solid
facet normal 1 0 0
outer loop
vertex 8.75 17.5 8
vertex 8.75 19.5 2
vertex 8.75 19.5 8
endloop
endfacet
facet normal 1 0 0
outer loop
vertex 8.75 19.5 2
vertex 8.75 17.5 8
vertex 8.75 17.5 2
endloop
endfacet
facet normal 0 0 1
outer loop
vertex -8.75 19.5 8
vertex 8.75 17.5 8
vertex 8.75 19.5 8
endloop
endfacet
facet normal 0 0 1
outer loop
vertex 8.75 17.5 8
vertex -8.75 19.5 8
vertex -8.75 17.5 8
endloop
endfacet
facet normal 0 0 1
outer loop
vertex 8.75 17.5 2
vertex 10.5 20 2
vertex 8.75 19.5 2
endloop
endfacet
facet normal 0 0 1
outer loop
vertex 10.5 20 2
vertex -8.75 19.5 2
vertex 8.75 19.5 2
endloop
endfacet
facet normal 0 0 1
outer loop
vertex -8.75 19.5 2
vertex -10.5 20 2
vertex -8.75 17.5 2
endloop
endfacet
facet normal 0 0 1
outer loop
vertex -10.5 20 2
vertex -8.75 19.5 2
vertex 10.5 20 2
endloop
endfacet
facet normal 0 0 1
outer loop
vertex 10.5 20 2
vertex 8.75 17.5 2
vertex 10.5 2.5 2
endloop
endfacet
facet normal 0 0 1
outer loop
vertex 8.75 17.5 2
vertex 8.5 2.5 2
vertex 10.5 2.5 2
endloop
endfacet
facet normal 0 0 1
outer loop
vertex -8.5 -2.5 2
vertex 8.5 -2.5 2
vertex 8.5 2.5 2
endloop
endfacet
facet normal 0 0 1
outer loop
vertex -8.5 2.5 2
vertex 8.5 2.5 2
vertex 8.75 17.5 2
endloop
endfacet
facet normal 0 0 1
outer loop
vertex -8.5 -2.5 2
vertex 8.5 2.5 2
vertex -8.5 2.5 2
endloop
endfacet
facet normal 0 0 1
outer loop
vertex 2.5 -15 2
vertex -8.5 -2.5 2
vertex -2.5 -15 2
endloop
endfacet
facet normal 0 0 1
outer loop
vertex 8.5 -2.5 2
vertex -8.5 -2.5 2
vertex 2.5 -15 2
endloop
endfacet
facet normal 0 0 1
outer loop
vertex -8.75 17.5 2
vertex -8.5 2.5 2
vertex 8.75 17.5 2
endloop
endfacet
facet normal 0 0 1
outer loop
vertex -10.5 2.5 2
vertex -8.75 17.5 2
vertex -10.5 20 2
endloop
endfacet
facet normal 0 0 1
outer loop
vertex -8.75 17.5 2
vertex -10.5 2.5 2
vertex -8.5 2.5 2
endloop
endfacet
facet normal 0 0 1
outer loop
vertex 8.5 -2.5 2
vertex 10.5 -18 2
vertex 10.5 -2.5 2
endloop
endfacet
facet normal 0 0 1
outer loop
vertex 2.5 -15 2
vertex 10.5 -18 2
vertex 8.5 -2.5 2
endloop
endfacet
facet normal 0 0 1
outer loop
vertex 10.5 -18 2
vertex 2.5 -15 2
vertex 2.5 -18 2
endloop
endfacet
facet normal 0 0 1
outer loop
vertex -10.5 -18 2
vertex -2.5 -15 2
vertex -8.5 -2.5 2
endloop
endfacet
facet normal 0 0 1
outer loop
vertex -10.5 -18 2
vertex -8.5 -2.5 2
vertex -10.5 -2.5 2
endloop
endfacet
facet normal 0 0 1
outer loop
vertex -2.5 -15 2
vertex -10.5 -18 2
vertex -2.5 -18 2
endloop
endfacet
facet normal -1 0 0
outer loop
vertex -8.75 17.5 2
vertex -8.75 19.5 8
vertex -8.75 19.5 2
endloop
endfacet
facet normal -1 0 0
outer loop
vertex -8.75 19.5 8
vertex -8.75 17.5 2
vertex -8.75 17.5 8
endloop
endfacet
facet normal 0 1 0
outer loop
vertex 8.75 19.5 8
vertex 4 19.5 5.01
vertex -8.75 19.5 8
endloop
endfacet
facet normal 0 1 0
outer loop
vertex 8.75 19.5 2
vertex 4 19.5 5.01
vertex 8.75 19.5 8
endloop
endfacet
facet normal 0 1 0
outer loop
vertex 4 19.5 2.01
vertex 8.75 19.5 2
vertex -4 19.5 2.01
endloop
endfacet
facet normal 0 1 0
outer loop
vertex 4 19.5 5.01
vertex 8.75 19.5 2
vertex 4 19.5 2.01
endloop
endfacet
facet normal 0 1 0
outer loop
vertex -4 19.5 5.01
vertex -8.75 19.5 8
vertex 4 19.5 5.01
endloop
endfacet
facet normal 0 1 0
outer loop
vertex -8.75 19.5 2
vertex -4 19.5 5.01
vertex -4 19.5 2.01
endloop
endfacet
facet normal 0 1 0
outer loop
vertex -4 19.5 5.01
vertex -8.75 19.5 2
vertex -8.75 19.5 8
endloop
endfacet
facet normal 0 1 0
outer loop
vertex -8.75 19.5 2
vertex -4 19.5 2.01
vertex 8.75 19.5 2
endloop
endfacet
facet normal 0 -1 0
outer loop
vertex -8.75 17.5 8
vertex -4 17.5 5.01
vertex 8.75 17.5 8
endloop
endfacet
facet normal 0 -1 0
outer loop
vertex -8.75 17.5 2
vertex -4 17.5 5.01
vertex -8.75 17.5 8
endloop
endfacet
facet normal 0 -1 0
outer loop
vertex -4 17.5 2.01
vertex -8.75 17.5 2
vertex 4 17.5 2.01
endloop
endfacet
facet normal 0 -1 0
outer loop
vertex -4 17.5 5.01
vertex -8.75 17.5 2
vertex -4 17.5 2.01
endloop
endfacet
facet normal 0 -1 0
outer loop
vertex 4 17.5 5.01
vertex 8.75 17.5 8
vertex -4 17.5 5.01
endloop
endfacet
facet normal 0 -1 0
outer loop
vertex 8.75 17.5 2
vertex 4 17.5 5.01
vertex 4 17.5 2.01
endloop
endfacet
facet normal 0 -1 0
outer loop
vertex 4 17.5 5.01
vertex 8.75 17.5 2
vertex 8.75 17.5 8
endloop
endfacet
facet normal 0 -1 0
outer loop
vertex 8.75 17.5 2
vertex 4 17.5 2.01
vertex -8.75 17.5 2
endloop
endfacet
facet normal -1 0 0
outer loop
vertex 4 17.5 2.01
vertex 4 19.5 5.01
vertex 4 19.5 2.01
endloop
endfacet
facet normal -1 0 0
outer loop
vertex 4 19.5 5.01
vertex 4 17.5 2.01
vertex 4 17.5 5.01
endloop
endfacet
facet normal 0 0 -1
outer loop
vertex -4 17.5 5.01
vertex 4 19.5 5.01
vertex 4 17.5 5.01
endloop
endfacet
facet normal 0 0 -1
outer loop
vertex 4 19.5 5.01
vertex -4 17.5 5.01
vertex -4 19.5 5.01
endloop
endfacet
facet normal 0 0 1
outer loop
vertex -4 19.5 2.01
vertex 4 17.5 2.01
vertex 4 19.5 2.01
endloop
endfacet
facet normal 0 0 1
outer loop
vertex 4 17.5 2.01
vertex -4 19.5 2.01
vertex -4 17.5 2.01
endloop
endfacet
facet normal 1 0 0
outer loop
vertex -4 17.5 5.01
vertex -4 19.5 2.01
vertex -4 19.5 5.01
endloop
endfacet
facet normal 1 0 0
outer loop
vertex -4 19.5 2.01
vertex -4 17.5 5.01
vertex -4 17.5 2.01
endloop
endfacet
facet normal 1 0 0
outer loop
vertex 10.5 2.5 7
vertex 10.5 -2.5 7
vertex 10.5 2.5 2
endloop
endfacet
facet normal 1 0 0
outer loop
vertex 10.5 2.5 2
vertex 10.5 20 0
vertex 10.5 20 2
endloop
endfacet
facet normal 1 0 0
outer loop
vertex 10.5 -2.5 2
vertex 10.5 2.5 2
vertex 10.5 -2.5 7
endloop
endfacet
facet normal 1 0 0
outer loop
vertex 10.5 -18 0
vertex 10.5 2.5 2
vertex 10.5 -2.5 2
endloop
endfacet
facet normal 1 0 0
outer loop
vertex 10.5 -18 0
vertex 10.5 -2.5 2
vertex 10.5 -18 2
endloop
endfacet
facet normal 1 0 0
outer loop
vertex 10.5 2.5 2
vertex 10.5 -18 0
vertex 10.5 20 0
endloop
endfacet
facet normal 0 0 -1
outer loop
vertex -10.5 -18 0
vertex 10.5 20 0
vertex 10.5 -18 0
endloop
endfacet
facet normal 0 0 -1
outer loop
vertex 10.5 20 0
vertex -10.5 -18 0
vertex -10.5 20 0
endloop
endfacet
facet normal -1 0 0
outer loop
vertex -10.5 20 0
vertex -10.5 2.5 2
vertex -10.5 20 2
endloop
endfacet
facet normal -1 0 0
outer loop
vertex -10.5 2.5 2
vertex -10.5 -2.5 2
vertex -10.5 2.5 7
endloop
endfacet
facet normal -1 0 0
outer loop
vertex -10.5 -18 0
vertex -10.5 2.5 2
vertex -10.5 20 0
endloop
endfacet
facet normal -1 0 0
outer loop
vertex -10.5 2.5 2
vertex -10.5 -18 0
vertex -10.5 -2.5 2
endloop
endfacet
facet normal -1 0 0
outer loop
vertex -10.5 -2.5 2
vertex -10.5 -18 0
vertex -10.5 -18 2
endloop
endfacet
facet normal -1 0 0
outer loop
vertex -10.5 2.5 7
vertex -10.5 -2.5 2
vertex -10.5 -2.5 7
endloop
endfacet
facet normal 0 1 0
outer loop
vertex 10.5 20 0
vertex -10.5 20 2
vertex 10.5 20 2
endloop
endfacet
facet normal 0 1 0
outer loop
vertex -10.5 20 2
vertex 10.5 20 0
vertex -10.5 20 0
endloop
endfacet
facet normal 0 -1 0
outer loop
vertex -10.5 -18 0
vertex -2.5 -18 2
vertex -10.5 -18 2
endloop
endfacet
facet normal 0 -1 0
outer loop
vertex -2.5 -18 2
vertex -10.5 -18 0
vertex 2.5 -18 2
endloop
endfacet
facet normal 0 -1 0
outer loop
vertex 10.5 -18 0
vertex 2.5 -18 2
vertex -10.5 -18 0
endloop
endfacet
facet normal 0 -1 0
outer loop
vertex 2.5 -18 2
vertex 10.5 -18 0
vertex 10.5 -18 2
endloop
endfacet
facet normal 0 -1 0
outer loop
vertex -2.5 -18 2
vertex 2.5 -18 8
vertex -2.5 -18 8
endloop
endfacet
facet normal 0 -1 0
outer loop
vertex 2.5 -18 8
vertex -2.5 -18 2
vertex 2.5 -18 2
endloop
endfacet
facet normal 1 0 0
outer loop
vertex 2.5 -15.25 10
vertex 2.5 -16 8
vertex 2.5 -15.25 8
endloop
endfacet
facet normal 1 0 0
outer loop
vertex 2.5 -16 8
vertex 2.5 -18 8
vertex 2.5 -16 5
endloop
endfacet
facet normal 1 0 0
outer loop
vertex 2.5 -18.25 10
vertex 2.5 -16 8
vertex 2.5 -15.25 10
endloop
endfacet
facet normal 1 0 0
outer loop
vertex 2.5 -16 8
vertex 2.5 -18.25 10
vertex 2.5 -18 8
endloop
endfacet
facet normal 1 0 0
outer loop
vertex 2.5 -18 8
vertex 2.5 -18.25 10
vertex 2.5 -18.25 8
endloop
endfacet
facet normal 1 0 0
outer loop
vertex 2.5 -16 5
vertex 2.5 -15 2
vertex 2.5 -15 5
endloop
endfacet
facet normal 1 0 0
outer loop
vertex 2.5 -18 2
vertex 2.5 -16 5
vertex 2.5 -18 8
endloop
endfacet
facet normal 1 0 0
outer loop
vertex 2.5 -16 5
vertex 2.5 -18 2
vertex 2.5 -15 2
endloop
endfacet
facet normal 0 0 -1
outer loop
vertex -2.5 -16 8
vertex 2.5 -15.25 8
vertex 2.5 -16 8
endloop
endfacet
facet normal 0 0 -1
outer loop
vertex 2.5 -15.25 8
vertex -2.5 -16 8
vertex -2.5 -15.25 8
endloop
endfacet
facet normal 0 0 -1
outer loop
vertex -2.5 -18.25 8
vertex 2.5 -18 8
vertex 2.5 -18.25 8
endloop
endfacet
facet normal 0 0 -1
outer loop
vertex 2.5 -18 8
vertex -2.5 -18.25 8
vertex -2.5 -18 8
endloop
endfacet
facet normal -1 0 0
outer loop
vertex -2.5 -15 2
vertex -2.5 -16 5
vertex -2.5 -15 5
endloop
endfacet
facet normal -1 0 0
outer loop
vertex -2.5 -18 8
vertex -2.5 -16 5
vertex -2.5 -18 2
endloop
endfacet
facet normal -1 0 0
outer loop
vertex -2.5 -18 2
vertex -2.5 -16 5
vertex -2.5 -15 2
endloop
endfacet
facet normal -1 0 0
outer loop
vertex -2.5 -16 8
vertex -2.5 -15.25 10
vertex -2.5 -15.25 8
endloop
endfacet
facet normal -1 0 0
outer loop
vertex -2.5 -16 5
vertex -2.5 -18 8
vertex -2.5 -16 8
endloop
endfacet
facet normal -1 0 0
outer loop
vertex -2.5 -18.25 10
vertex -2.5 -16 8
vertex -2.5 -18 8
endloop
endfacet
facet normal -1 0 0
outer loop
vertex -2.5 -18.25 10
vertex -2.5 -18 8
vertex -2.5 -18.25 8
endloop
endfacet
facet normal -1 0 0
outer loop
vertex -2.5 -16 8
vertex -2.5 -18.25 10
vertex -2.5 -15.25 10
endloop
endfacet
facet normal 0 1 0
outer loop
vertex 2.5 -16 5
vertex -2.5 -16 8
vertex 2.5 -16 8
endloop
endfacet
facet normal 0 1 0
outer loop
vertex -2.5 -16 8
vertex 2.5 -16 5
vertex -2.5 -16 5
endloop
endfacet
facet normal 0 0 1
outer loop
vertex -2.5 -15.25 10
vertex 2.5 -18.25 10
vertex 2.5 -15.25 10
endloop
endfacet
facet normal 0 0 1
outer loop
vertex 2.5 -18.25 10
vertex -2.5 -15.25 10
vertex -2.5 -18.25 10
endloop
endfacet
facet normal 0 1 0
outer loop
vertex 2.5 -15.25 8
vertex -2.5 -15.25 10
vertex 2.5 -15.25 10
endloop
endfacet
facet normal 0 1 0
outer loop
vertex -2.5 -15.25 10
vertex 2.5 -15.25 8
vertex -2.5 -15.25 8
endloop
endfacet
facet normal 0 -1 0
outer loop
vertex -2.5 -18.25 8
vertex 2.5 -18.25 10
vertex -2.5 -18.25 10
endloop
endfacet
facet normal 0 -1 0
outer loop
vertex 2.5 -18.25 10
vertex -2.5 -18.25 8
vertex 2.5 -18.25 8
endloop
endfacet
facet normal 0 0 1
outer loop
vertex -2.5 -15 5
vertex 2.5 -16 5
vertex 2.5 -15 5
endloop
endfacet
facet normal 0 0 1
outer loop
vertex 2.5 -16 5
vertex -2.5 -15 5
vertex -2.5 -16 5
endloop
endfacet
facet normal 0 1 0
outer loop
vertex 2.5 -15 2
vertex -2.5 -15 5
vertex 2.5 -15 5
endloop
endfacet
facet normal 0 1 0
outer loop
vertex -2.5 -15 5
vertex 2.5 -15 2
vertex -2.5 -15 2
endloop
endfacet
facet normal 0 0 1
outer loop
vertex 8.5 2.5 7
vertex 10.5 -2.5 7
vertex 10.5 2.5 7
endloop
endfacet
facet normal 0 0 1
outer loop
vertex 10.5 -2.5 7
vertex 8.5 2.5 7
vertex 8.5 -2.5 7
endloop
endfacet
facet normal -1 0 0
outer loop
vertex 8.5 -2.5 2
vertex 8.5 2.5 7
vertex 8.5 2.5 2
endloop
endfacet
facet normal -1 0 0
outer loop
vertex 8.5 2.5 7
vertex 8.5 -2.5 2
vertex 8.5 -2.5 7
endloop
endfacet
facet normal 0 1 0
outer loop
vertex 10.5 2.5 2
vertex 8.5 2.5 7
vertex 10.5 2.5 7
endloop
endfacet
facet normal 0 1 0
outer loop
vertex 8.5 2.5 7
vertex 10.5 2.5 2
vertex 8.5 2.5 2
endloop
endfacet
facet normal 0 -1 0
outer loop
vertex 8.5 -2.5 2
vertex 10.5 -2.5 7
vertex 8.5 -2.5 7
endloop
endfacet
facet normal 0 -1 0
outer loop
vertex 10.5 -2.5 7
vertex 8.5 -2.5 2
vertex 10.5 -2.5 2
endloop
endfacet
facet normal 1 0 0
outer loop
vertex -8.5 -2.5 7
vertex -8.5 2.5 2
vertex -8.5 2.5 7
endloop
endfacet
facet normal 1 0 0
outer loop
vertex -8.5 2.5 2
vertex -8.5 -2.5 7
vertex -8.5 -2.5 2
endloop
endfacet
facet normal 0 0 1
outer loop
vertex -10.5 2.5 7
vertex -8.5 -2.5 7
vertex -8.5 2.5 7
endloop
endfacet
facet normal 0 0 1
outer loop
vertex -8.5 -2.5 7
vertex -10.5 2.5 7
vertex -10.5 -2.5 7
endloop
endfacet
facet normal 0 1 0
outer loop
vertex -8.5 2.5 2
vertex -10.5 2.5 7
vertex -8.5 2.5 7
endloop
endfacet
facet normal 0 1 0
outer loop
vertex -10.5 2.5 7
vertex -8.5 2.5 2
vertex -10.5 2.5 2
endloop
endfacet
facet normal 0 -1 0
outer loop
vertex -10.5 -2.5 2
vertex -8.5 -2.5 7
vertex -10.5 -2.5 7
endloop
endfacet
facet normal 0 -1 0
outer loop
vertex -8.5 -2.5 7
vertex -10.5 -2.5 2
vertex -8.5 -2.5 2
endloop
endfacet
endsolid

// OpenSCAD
//stepperMotorDriverMount();

wallThickness = 2;

translate([0,1,wallThickness/2])
cube([17+wallThickness*2,34+wallThickness*2, wallThickness], center = true);
translate([0,-17,wallThickness+3])
cube([5,wallThickness,6], center = true);
translate([0,-16.75,wallThickness+7])
cube([5,wallThickness*1.5,2], center = true);
translate([0,-16,wallThickness+1.5])
cube([5,2,3], center = true);

translate([9.5,0,wallThickness+2.5])
cube([wallThickness,5,5], center = true);
translate([-9.5,0,wallThickness+2.5])
cube([wallThickness,5,5], center = true);

difference() {
    translate([0,18.5,wallThickness+3])
    cube([17.5,wallThickness,6], center = true);
    translate([0,0,wallThickness+1.51])
    cube([8,50,3], center = true);
}

//$fn = 100;
module shotHolder() {
    difference() {
        union() {
            tube(20, 25, 10);
            translate([0,25,5])
            cube([12, 6, 10], center = true);
        }
        translate([0,28.1,5])
        rotate([90,0,0])
        intersection() {
            cylinder(r = 2.7, h = 6);
            translate([0,0,3])
            cube([3,6,6], center = true);
        }
    }
}

module stepperMotorDriverMount() {
    difference() {
        translate([0,0,1.5])
        cube([37,34,3], center = true);
        translate([0,0,2.01])
        cube([35,32,2],center=true);
    }
    translate([0,0,1]) {
        translate([15,13,0])
        cylinder(r = 1, h = 2);
        translate([-15,13,0])
        cylinder(r = 1, h = 2);
        translate([15,-13,0])
        cylinder(r = 1, h = 2);
        translate([-15,-13,0])
        cylinder(r = 1, h = 2);
    }
}

module tube(innerRadius, outerRadius, height) {
    difference() {
        cylinder(r = outerRadius, h = height);
        translate([0,0,-1]) cylinder(r = innerRadius, h = height + 2);
    }
}
